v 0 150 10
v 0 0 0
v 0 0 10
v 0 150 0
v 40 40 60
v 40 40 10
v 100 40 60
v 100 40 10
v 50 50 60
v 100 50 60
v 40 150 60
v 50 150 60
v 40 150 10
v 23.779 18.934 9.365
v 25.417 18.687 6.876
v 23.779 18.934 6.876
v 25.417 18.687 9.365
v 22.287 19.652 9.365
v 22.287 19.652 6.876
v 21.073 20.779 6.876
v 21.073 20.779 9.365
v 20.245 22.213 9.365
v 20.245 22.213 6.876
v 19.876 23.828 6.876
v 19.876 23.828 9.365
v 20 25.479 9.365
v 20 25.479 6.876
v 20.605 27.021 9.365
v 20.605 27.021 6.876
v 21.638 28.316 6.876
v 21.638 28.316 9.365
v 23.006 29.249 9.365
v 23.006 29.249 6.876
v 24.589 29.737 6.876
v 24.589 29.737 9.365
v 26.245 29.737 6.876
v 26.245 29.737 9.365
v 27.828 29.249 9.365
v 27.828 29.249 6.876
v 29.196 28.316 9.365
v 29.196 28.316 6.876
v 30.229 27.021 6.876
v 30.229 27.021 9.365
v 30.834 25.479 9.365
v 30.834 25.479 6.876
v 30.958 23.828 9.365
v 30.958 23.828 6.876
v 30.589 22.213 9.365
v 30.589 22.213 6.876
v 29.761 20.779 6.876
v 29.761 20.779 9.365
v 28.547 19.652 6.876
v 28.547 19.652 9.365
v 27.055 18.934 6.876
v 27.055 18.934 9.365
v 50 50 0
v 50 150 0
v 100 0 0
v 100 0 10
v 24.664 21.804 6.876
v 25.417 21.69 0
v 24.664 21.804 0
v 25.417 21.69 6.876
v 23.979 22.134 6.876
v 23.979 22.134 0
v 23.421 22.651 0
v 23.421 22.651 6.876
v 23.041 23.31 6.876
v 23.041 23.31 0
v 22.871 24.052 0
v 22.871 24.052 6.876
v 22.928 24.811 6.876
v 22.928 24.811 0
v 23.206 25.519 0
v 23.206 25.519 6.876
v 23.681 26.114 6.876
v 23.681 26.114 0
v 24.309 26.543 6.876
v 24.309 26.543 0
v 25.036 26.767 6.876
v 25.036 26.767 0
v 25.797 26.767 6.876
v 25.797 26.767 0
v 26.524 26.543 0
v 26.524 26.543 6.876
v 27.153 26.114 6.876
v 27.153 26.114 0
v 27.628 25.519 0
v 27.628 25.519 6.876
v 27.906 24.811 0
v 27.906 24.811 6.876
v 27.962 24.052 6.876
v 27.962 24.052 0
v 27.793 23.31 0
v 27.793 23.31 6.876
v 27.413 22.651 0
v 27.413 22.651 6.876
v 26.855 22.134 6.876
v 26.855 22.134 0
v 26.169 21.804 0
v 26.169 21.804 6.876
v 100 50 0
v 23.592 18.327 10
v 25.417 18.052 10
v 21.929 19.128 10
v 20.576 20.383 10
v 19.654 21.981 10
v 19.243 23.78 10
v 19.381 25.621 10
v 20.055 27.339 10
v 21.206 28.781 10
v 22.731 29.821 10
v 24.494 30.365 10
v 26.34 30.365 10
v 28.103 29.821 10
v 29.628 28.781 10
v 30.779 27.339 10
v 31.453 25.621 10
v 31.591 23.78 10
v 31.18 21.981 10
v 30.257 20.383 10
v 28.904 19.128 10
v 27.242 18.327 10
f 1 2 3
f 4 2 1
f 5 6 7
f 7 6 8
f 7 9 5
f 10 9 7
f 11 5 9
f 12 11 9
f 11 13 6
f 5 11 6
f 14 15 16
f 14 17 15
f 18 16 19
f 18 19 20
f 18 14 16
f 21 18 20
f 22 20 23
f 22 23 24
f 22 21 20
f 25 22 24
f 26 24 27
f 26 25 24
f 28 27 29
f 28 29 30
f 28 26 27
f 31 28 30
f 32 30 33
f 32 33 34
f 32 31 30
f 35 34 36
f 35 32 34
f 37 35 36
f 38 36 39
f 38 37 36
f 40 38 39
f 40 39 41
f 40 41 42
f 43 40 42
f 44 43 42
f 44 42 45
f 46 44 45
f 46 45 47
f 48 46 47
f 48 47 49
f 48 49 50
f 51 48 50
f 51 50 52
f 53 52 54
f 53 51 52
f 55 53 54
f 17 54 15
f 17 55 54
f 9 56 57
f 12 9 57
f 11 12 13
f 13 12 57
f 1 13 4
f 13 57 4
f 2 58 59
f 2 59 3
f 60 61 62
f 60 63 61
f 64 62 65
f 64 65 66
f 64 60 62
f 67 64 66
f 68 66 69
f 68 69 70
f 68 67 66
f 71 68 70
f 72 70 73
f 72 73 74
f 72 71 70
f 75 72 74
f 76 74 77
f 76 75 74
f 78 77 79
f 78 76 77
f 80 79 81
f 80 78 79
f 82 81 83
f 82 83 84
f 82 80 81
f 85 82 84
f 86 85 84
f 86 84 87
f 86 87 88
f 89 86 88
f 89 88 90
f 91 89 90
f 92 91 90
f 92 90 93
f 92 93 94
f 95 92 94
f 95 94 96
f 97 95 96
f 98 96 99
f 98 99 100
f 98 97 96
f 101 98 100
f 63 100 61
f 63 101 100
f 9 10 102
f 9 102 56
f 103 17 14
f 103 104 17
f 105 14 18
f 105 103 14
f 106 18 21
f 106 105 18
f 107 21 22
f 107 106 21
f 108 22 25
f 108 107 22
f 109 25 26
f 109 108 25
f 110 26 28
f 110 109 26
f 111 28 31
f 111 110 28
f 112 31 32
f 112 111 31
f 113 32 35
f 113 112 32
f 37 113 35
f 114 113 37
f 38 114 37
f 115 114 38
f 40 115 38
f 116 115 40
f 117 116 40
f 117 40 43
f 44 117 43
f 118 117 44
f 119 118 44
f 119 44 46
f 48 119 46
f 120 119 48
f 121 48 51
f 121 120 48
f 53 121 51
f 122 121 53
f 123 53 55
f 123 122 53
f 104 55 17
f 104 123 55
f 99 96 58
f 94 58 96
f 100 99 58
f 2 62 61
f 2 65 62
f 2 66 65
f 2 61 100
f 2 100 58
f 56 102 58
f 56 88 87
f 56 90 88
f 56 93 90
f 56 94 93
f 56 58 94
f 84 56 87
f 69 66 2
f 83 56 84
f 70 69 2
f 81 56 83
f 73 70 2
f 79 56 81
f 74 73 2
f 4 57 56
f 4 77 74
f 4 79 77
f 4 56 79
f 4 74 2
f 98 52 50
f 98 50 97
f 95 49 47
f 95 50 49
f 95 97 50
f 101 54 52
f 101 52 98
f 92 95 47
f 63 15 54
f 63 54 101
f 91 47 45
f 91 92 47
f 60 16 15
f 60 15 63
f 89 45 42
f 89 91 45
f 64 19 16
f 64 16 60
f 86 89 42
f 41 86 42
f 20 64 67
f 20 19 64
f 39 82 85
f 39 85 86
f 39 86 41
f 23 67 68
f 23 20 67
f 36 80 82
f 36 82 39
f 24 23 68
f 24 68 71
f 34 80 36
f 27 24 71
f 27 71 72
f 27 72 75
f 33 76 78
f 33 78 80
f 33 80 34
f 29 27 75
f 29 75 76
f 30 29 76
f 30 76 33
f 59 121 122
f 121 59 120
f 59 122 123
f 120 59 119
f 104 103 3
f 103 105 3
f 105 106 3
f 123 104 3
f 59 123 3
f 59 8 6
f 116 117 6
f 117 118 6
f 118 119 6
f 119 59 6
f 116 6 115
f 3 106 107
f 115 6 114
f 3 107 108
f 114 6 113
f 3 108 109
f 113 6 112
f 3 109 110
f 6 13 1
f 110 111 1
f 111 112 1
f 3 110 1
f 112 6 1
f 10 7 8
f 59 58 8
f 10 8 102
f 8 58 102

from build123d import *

# Parameters (mm, degrees)
BOSS_EXTRUDE1_DEPTH = 10
BOSS_EXTRUDE2_DEPTH = 50


with BuildPart() as part:
    # Sketch1 → Boss-Extrude1 (new body)
    with BuildSketch(Plane.XY):
        Polygon((0, 150), (50, 150), (50, 50), (100, 50), (100, 0), (0, 0), align=None)
    extrude(amount=BOSS_EXTRUDE1_DEPTH)

    # Sketch2 → Boss-Extrude2 (add)
    with BuildSketch(Plane.XY.offset(10)):
        Polygon((40, 150), (40, 40), (100, 40), (100, 50), (50, 50), (50, 150), align=None)
    extrude(amount=BOSS_EXTRUDE2_DEPTH)

    # Sketch3 → CBORE for #10 Binding Head Machine Screw1 (revolve, cut)
    with BuildSketch(Plane(origin=(25.416829558, 24.242970072, 10), x_dir=(0, -1, 0), z_dir=(1, 0, 0))):
        Polygon((0, 0), (0, 10), (2.5527, 10), (2.5527, 3.1242), (5.55625, 3.1242), (5.55625, 0.635), (6.19125, 0), align=None)
    revolve(axis=Axis((25.416829558, 24.242970072, 16.35), (0, 0, -1)), mode=Mode.SUBTRACT)


solid = part.part
